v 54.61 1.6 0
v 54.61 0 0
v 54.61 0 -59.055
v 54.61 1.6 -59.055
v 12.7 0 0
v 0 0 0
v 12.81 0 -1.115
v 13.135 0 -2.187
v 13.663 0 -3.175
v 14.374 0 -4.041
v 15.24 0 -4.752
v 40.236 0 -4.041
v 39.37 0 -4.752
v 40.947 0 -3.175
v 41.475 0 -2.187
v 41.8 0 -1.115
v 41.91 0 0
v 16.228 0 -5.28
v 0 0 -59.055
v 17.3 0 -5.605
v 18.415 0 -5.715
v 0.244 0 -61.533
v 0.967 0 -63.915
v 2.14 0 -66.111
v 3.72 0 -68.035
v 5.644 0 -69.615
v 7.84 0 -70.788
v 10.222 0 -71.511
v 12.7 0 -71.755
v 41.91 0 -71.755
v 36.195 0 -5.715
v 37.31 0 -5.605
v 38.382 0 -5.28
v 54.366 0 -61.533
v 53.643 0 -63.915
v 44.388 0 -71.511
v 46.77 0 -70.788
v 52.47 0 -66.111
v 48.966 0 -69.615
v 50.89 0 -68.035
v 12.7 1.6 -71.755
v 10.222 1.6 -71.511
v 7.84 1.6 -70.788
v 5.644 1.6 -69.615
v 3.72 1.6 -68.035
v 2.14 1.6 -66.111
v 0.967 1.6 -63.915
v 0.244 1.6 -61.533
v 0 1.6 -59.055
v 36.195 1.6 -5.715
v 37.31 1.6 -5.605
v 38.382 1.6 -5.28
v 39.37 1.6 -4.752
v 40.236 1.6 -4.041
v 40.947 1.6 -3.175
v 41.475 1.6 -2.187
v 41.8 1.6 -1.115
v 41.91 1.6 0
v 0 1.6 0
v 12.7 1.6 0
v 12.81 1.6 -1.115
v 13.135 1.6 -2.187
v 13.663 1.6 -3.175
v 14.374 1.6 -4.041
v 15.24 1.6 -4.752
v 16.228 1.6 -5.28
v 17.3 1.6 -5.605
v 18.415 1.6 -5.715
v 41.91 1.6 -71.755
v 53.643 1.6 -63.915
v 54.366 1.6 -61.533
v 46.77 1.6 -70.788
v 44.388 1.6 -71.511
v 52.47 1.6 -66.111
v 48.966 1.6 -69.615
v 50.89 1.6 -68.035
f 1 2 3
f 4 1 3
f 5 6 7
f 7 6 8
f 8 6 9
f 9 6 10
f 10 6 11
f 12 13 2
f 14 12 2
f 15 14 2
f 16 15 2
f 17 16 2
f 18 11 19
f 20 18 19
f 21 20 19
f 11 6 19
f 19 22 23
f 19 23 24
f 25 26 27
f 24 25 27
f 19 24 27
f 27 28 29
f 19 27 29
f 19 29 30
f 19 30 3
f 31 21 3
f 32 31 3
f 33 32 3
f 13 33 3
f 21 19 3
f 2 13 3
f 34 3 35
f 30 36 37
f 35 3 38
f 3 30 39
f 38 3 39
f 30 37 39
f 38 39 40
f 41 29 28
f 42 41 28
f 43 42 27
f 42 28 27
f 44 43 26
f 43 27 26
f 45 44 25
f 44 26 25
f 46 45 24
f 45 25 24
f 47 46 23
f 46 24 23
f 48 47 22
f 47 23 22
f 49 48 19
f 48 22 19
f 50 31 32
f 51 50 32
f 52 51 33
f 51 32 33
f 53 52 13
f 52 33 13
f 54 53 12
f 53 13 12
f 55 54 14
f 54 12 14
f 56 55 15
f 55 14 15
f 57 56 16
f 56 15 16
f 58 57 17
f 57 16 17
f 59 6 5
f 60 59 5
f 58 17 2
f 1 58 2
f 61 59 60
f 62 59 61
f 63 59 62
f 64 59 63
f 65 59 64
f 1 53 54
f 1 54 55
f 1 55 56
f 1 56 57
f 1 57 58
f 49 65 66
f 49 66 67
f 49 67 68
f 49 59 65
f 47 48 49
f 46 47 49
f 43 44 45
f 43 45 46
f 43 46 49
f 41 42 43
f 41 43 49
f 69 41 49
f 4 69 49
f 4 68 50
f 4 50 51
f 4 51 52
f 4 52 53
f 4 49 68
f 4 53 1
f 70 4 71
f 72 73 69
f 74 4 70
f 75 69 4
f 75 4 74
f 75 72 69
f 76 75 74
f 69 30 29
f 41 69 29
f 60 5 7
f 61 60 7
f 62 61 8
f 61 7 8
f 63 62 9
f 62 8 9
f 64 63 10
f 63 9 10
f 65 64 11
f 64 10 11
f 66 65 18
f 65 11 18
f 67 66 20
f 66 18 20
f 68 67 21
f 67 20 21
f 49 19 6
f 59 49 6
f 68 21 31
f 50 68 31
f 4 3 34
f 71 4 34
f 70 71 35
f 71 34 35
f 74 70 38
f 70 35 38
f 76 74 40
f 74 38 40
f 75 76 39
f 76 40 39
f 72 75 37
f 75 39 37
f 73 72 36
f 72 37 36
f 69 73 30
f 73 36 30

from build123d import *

# Parameters (mm, degrees)
BOSS_EXTRUDE1_DEPTH = 1.6


with BuildPart() as part:
    # Sketch2 → Boss-Extrude1 (new body)
    with BuildSketch(Plane(origin=(0, 0, 0), x_dir=(1, 0, 0), z_dir=(0, 1, 0))):
        with BuildLine():
            Line((0, 0), (12.7, 0))
            ThreePointArc((12.7, 0), (14.373884746, 4.041115254), (18.415, 5.715))
            Line((18.415, 5.715), (36.195, 5.715))
            ThreePointArc((36.195, 5.715), (40.236115254, 4.041115254), (41.91, 0))
            Line((41.91, 0), (54.61, 0))
            Line((54.61, 0), (54.61, 59.055))
            ThreePointArc((54.61, 59.055), (50.890256121, 68.035256121), (41.91, 71.755))
            Line((41.91, 71.755), (12.7, 71.755))
            ThreePointArc((12.7, 71.755), (3.719743879, 68.035256121), (0, 59.055))
            Line((0, 59.055), (0, 0))
        make_face()
    extrude(amount=BOSS_EXTRUDE1_DEPTH)


solid = part.part
